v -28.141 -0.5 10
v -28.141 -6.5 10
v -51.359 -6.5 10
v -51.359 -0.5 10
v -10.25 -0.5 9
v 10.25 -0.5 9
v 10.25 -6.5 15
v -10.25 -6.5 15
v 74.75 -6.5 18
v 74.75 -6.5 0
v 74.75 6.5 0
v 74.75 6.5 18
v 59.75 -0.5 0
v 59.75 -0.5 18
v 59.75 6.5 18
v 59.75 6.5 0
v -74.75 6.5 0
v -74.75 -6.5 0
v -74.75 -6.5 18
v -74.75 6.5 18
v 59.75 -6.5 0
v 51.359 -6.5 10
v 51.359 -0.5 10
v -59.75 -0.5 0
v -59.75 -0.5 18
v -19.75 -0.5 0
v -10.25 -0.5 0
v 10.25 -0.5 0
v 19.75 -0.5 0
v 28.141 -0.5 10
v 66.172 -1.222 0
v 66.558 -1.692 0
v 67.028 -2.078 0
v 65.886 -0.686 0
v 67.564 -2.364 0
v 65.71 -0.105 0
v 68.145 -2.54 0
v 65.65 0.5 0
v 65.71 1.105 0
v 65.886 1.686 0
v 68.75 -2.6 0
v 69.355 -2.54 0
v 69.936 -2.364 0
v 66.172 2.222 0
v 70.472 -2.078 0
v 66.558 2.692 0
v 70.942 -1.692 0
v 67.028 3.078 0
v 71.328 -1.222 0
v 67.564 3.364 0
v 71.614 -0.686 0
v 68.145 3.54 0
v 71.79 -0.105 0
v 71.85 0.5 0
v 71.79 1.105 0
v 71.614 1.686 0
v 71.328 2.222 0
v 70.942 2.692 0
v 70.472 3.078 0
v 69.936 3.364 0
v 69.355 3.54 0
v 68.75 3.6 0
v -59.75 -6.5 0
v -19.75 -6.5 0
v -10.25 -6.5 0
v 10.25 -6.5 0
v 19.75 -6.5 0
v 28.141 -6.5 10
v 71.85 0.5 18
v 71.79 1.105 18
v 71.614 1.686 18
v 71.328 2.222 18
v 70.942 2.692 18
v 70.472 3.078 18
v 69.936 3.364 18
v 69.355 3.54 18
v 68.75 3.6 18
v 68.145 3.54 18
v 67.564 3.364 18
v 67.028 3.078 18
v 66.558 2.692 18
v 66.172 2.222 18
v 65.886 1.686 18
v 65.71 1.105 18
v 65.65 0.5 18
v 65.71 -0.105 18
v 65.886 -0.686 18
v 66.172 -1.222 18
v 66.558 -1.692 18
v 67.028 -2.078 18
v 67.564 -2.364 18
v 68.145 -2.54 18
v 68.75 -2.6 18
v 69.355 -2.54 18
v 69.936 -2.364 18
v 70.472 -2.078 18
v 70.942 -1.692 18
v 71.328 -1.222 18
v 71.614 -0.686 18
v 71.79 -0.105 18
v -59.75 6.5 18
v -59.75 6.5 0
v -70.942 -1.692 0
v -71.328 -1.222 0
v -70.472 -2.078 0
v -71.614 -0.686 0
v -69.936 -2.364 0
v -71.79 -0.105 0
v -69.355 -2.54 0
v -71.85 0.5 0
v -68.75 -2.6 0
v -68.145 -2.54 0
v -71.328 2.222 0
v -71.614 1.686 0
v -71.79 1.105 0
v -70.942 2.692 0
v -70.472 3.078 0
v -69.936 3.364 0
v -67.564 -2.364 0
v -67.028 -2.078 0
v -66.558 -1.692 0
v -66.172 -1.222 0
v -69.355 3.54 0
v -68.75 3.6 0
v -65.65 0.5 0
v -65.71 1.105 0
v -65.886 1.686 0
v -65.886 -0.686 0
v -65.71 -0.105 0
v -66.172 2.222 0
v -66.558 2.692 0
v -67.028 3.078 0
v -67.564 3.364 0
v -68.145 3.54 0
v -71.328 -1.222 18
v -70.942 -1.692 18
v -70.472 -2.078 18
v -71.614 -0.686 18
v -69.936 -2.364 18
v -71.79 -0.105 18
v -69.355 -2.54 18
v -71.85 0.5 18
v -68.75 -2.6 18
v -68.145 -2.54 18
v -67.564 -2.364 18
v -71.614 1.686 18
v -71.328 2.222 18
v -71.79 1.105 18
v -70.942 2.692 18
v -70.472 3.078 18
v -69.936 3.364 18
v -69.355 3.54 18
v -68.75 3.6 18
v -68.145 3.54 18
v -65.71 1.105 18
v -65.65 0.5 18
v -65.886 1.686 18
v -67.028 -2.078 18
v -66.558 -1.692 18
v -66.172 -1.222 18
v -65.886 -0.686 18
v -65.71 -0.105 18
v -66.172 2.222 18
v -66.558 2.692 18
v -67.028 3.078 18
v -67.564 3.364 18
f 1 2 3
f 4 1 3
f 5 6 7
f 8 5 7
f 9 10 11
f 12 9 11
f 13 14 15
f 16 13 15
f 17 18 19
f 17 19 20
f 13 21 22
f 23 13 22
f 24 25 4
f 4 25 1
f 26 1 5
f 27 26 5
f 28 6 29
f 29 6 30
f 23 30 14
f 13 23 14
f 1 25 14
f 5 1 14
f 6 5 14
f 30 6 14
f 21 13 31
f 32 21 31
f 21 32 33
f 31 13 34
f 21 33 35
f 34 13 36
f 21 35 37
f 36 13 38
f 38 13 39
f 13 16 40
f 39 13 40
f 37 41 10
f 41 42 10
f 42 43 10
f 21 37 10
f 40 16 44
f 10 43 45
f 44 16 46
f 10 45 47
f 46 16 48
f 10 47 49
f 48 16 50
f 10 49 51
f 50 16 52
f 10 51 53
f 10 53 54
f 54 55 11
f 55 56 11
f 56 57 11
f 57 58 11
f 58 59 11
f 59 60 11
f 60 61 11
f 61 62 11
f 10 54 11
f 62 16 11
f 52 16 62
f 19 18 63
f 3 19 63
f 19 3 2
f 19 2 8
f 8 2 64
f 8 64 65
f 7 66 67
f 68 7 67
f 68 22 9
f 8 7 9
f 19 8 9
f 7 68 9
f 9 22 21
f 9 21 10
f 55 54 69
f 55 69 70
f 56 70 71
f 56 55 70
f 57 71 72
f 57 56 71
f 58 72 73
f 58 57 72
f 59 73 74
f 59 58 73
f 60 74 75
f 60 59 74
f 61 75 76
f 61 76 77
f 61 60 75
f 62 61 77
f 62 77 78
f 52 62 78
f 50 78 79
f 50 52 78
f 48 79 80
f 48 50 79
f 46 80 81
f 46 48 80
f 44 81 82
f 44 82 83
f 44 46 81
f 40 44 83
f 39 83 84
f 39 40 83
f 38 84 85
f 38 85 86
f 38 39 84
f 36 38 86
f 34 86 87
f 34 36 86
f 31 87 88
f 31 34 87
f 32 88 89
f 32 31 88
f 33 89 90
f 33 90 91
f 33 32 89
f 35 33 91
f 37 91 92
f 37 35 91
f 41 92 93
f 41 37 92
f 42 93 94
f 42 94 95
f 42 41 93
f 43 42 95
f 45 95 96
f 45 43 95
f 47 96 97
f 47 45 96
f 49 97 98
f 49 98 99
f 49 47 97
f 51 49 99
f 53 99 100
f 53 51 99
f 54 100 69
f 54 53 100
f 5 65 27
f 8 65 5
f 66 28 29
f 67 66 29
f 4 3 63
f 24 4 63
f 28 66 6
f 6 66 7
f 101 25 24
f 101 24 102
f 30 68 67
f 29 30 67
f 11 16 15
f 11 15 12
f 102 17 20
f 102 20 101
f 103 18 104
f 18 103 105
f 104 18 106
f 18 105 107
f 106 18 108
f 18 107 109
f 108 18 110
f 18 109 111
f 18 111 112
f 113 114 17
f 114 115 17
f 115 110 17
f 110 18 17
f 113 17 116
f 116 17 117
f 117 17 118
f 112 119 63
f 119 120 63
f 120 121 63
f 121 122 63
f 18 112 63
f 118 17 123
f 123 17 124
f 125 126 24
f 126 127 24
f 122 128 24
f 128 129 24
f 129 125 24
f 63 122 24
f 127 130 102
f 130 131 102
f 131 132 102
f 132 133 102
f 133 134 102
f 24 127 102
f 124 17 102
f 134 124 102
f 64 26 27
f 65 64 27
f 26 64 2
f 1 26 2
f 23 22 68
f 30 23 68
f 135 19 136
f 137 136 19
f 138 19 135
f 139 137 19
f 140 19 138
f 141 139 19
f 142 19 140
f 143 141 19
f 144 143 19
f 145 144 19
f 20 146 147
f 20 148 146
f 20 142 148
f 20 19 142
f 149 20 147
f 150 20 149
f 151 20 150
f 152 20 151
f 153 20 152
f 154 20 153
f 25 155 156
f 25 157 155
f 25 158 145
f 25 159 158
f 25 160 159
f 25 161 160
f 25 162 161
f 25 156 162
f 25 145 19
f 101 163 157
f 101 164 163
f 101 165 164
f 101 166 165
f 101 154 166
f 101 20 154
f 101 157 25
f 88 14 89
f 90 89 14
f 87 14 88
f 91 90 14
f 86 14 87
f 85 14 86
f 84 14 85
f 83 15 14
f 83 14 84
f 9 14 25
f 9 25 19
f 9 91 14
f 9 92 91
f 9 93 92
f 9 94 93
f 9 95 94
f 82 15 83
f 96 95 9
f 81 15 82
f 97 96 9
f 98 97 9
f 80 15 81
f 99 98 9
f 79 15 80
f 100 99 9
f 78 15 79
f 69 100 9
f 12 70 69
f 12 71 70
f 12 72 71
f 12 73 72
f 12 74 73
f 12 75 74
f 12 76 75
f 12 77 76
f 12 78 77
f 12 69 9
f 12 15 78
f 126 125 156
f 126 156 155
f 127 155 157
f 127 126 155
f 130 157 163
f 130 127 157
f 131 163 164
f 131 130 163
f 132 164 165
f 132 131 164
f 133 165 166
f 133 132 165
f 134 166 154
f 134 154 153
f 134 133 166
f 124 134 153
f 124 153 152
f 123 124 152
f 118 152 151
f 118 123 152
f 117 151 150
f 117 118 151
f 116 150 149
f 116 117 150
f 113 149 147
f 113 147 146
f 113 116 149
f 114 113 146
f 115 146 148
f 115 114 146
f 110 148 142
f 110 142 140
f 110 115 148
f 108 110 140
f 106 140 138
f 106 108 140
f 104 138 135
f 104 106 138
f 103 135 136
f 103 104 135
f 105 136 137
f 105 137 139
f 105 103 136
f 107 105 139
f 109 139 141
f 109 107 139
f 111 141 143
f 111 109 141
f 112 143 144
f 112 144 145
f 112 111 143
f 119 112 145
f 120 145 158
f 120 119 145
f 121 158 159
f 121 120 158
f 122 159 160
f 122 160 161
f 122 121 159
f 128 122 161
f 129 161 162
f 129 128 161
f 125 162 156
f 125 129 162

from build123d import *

# Parameters (mm, degrees)
F0_W     = 149.5
F0_H     = 13
F0_R     = 3.1
F1_DEPTH = 18
F3_DEPTH = 10.25
F4_W     = 119.5
F4_H     = 7
F5_DEPTH = 18.001
F7_DEPTH = 25


with BuildPart() as f1:
    # F0 (on Top) → F1 (new body)
    with BuildSketch(Plane.XY):
        Rectangle(F0_W, F0_H)
        with Locations((-68.75, 0.5)):
            Circle(F0_R, mode=Mode.SUBTRACT)
        with Locations((68.75, 0.5)):
            Circle(F0_R, mode=Mode.SUBTRACT)
    extrude(amount=F1_DEPTH)

    # F2 (on Right) → F3 (cut, symmetric)
    with BuildSketch(Plane.YZ):
        Polygon((-6.5, 0), (8.5, 0), (-6.5, 15), align=None)
    extrude(amount=F3_DEPTH, both=True, mode=Mode.SUBTRACT)

    # F4 (on face) → F5 (cut, through all)
    with BuildSketch(Plane.XY.offset(18)):
        with Locations((0, 3)):
            Rectangle(F4_W, F4_H)
    extrude(amount=-F5_DEPTH, mode=Mode.SUBTRACT)

    # F6 (on face) → F7 (cut)
    with BuildSketch(Plane.XZ.offset(6.5)):
        Polygon((-51.359004, 10), (-59.75, 0), (-19.75, 0), (-28.140996, 10), align=None)
        Polygon((28.140996, 10), (19.75, 0), (59.75, 0), (51.359004, 10), align=None)
    extrude(amount=-F7_DEPTH, mode=Mode.SUBTRACT)


solid = f1.part
